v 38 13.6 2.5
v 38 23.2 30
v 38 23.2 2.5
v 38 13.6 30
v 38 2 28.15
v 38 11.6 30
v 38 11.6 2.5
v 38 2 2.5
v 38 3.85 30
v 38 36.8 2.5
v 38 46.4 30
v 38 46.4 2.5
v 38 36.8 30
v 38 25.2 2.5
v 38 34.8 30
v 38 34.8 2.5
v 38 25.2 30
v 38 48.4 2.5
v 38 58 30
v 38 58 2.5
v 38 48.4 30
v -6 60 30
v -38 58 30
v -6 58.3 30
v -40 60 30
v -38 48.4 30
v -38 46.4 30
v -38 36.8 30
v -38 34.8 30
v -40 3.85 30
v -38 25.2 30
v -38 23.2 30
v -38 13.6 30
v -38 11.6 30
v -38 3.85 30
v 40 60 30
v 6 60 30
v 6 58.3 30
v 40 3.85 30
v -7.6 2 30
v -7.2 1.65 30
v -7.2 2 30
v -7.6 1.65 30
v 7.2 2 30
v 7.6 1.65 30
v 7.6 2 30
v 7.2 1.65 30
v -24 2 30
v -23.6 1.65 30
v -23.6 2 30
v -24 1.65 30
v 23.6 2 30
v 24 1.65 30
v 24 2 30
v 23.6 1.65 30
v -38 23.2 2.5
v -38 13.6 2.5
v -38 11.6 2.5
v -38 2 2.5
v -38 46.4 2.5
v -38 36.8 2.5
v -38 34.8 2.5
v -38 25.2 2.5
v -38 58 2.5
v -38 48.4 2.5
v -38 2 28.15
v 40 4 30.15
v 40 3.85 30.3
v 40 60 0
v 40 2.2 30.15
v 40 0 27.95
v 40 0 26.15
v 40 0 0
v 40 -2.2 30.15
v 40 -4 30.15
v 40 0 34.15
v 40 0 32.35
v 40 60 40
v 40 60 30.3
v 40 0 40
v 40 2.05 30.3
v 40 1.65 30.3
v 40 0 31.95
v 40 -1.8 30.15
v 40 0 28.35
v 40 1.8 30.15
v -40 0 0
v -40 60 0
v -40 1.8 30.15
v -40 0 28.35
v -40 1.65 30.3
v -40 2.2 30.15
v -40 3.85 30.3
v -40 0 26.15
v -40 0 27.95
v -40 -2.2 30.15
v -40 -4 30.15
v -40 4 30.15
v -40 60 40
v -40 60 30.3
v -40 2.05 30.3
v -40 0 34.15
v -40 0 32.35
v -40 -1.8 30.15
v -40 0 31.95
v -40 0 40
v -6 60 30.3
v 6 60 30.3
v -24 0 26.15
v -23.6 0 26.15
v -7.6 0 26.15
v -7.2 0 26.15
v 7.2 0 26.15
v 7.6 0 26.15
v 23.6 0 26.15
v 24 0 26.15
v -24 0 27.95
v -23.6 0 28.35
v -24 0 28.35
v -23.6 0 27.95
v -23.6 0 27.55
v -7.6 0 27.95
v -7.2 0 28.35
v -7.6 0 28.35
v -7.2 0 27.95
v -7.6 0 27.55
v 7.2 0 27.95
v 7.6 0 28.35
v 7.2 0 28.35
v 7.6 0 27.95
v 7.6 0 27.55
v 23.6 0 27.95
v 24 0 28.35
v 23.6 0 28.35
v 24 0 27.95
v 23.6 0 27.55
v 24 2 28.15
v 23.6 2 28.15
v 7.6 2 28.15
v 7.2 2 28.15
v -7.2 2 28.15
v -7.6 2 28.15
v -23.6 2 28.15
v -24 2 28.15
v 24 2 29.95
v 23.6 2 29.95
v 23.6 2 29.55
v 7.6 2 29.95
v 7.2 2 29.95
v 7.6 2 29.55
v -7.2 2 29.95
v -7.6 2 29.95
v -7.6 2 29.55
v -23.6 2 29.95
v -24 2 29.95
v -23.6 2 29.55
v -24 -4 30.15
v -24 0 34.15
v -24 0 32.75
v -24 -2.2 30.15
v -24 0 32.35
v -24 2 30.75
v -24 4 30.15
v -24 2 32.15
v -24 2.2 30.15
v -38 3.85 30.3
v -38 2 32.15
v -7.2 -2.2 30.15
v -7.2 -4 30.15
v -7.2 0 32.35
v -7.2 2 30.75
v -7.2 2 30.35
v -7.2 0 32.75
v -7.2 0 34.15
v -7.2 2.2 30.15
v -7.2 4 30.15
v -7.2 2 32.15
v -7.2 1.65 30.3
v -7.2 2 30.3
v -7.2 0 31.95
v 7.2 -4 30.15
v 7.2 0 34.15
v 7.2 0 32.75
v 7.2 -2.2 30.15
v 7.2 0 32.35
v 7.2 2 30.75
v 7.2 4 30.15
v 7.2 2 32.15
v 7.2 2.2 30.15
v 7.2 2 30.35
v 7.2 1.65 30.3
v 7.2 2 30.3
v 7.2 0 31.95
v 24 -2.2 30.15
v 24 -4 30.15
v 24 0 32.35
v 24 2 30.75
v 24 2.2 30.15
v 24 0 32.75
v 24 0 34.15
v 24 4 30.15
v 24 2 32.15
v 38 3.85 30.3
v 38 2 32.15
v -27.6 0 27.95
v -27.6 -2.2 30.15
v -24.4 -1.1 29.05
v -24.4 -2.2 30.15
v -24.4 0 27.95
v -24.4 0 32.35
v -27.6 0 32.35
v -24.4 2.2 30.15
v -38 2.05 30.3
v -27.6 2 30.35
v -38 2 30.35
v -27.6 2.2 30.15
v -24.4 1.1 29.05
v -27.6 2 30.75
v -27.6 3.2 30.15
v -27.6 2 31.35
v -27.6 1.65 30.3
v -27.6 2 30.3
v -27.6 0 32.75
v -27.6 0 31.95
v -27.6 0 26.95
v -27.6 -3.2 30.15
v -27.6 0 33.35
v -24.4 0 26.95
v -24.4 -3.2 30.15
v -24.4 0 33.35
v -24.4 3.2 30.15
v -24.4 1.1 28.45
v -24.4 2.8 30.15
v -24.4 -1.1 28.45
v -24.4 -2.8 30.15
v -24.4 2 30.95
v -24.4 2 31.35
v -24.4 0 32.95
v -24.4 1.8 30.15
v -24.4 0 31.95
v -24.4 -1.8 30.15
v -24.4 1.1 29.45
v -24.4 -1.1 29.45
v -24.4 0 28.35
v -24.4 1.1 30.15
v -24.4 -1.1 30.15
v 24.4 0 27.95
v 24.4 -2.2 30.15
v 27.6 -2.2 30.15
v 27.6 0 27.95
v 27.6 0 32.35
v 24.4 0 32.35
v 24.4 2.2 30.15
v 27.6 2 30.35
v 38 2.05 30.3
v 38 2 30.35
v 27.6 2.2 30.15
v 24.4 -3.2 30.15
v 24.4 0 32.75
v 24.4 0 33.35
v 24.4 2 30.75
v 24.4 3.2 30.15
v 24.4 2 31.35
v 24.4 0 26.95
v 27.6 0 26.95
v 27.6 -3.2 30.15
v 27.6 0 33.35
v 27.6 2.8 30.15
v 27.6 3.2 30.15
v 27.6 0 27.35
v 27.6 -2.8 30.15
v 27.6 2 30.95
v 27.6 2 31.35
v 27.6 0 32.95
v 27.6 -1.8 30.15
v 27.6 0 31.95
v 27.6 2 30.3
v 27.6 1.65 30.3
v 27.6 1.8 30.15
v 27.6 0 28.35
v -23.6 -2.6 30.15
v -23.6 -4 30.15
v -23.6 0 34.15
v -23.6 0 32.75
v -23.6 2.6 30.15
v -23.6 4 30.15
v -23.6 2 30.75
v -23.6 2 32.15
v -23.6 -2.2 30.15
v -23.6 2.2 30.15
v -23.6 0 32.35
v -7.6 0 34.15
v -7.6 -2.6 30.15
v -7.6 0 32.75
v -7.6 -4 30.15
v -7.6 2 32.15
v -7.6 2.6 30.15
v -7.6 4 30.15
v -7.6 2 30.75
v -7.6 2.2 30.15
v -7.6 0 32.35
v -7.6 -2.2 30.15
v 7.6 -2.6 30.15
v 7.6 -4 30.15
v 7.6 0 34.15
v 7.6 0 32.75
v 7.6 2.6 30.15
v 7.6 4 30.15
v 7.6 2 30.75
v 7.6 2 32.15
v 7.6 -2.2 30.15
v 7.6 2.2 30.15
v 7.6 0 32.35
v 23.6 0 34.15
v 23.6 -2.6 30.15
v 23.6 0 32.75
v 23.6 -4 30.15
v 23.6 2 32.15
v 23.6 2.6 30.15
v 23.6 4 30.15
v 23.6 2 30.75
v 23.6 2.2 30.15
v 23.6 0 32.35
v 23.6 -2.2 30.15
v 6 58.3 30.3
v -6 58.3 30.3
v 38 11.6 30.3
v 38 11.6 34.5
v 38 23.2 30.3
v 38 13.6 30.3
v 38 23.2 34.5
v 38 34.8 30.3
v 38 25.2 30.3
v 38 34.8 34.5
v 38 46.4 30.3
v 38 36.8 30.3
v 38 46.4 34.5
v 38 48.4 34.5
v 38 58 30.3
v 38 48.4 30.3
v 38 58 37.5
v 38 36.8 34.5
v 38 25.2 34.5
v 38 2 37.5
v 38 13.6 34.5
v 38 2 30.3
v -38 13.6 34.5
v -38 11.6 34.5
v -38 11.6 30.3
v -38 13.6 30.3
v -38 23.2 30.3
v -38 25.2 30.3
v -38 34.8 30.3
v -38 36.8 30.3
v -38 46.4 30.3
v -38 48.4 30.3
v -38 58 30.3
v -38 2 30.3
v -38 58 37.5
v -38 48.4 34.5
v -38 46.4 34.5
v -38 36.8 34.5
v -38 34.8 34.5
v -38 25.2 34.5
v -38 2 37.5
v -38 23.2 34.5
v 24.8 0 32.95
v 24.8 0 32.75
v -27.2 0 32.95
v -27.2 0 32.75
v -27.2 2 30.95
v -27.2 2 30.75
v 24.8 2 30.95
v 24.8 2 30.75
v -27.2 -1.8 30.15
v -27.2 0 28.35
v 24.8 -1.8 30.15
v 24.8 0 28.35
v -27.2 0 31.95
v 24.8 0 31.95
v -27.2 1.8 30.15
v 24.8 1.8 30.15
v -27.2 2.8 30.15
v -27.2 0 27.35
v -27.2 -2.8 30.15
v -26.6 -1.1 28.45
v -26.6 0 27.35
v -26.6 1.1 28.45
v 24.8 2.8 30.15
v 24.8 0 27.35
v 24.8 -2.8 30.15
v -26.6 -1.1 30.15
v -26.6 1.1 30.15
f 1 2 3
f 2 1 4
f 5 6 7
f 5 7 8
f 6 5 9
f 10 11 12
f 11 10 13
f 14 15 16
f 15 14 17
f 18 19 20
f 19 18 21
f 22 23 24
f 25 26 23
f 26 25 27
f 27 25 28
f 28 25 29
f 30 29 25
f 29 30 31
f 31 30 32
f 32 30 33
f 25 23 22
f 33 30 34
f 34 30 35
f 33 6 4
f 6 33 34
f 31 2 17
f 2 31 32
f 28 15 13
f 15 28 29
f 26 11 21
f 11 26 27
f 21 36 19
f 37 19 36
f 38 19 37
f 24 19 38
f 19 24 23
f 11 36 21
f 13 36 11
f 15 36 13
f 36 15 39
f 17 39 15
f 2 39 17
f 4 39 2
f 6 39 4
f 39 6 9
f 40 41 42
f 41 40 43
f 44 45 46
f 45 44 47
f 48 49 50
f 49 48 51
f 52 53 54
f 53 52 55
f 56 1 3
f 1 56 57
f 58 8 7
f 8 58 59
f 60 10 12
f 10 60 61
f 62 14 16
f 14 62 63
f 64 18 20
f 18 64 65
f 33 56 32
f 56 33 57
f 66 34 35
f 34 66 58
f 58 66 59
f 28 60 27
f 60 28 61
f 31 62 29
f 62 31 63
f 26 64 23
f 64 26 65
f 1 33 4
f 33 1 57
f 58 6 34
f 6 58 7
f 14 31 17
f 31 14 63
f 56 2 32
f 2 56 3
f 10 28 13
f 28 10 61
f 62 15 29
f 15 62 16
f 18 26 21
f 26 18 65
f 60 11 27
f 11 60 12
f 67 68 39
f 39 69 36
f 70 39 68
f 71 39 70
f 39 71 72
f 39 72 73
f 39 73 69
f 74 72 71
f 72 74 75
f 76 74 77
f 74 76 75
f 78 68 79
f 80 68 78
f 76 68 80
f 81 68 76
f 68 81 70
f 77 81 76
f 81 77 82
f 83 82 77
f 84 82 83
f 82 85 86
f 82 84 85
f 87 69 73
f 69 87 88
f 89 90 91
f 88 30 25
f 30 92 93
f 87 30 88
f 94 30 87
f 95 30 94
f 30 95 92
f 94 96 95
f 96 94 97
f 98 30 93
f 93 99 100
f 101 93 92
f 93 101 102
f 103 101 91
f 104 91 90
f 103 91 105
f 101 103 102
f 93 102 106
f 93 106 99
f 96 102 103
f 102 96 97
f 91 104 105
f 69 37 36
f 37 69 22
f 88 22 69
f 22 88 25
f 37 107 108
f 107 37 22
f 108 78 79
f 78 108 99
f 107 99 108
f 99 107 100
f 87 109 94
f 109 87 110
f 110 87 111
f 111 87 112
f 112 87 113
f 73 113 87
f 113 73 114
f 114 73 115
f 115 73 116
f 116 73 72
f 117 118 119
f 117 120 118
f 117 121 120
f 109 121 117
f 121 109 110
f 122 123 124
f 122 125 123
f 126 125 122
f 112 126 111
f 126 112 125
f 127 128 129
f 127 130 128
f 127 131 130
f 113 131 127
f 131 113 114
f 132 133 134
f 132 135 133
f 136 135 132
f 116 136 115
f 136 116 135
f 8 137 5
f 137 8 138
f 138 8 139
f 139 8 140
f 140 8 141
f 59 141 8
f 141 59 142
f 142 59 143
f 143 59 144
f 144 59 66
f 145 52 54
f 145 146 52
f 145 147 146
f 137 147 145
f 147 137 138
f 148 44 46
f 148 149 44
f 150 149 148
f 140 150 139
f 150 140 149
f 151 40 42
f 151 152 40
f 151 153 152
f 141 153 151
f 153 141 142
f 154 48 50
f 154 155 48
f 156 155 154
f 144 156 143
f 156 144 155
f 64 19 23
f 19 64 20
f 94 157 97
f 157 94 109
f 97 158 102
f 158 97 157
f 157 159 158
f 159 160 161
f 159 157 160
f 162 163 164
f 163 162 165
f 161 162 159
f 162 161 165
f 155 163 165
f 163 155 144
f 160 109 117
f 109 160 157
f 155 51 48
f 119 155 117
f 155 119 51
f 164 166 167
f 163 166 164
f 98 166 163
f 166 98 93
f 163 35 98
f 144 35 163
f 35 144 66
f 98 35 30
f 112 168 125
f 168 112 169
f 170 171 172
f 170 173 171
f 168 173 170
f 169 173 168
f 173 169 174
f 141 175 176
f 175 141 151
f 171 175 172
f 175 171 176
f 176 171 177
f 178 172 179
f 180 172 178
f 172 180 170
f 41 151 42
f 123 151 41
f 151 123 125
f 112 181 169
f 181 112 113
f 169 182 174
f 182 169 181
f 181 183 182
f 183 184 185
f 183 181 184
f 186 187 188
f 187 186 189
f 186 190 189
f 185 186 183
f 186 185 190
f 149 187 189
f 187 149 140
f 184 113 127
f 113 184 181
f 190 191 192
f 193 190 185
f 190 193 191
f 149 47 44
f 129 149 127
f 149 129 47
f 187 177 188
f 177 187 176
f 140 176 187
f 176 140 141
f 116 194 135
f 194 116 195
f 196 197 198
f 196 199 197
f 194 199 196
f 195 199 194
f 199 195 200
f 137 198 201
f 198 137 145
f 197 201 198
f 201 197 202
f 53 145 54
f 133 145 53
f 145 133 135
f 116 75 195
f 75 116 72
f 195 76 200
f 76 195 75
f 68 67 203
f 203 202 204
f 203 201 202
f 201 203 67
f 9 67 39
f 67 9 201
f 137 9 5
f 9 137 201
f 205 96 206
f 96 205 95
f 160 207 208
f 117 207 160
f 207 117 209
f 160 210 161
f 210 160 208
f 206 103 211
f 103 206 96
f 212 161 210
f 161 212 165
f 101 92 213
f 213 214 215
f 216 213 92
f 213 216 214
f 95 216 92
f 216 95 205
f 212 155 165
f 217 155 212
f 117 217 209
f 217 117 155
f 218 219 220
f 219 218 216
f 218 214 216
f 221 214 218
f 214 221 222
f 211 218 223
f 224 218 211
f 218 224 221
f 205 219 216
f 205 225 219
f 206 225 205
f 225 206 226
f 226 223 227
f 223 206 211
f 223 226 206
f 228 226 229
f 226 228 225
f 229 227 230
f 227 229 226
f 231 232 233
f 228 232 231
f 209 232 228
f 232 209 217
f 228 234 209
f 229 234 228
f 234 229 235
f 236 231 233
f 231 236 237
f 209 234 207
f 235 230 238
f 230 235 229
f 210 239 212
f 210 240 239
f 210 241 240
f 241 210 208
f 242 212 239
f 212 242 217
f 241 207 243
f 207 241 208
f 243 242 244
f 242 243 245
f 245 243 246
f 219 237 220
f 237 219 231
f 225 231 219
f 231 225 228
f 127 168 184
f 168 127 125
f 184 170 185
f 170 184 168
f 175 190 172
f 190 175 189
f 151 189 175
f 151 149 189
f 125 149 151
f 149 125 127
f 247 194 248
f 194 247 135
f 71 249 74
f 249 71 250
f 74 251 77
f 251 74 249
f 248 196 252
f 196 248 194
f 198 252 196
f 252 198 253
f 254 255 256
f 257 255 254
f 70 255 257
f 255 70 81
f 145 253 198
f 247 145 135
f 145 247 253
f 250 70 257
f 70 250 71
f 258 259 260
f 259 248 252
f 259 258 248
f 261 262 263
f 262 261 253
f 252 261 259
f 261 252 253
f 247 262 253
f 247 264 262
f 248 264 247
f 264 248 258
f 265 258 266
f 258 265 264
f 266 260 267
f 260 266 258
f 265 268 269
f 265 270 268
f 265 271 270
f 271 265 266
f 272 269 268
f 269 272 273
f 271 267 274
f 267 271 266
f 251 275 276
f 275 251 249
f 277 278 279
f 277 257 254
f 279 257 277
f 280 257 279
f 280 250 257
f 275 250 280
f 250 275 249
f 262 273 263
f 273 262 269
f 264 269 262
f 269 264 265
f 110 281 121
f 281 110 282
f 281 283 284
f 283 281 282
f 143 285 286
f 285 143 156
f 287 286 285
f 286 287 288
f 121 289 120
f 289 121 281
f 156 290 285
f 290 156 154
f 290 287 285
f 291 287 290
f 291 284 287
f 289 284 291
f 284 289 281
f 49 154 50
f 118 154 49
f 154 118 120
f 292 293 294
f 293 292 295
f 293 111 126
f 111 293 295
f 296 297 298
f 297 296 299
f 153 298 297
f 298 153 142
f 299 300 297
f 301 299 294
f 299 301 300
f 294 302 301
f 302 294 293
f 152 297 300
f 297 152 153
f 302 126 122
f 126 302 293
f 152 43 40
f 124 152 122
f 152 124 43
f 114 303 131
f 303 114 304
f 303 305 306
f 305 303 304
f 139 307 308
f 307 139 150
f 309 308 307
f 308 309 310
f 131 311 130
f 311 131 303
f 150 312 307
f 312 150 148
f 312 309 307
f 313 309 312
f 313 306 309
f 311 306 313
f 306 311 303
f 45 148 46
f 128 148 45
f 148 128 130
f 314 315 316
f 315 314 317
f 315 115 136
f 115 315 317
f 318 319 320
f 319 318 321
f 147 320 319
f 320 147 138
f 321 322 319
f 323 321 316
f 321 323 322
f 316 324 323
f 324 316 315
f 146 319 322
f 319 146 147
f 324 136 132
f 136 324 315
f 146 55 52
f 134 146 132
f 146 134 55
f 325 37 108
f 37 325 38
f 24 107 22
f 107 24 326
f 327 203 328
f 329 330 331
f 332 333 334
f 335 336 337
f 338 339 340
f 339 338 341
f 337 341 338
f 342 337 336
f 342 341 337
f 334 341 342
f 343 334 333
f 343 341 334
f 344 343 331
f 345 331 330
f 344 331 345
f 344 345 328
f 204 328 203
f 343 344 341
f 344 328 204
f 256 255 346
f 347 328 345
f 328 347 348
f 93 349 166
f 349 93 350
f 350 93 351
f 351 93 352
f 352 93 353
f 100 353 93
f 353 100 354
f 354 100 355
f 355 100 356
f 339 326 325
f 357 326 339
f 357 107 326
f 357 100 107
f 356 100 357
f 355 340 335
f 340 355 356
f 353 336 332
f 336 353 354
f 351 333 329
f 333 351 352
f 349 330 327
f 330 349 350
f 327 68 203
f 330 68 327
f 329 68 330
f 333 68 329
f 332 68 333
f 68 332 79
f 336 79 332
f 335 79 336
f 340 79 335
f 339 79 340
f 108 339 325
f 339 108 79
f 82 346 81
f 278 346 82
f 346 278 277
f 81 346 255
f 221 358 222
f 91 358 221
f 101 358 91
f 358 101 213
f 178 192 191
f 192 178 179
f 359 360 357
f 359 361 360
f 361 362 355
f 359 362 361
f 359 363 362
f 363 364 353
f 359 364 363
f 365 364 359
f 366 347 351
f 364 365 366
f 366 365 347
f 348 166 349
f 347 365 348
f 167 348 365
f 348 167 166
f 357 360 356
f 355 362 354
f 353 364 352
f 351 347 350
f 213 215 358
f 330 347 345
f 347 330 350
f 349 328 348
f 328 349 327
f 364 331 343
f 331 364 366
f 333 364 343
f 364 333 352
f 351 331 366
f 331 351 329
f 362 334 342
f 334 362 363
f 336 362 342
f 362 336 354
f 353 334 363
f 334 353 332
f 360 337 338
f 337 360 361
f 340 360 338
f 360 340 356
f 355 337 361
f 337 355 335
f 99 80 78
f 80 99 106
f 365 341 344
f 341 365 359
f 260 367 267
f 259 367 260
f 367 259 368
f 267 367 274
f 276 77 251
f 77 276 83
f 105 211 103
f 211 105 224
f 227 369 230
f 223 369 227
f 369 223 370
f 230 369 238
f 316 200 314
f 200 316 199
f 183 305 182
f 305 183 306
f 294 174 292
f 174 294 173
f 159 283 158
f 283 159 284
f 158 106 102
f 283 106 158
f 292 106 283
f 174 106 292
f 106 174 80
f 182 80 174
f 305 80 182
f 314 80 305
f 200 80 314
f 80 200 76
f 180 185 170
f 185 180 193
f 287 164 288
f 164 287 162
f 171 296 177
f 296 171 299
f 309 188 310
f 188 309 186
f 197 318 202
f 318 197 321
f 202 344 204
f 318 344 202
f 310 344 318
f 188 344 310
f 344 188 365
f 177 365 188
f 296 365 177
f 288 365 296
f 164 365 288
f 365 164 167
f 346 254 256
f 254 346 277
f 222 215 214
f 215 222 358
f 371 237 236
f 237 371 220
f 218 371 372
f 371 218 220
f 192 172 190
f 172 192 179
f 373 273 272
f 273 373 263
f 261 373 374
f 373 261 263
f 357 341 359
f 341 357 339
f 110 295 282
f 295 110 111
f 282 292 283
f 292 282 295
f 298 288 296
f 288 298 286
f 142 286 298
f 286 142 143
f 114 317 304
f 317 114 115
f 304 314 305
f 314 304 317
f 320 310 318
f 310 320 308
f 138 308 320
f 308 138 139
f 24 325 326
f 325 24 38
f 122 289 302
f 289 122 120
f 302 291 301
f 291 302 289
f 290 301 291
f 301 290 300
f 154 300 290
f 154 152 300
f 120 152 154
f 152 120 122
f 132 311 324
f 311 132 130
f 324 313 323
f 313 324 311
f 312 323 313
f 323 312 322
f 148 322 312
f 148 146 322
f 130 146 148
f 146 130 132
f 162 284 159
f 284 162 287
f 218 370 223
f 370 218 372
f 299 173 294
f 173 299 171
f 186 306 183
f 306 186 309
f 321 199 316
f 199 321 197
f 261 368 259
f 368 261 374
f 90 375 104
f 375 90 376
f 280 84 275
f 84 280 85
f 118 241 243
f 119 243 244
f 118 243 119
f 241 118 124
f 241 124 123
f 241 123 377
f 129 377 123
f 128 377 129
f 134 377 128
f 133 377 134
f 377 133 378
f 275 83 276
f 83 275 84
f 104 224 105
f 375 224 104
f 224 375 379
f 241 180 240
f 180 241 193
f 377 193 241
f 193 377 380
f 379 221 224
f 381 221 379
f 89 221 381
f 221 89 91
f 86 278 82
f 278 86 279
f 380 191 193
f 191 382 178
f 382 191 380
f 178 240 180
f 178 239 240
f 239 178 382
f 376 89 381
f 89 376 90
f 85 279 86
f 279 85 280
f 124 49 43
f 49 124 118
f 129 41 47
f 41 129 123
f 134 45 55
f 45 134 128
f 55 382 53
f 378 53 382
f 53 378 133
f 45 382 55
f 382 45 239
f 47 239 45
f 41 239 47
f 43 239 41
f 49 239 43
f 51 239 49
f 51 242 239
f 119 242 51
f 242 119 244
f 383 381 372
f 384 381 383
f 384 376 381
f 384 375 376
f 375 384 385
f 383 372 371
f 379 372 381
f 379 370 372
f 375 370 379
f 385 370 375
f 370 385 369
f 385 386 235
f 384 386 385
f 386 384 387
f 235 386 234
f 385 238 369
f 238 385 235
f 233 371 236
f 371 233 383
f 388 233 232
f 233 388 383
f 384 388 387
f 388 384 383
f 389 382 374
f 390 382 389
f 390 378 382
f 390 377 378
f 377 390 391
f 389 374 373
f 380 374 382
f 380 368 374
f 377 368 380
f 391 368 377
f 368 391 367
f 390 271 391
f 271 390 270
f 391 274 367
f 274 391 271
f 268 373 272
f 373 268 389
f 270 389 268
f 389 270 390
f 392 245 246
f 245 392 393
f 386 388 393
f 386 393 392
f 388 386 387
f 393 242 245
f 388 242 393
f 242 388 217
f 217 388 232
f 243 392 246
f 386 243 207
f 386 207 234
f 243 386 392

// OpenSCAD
/* Box with print-in-place hinge - step 1: params + base */
part = "assembly"; // [base, lid, pin, assembly]

cadverify_only = "";
module instance(name, part, unit = 1) {
    echo(cadverify_instance = [name, part, unit]);
    if (cadverify_only == "" || cadverify_only == name) children();
}

// ---- parameters (mm) ----
W = 80; D = 60; H = 40;          // body outer, closed
baseH = 30;                      // base height
gapZLid = 0.3;                   // lid-base vertical gap
lidBot = baseH + gapZLid;        // 30.3
lidTop = H;                      // 40
axY = 2; axZ = baseH + gapZLid/2; // hinge axis (2, 30.15)
wallT = 2; floorT = 2.5; lidTopT = 2.5;
pinH = 1.8; boreH = 2.2; outH = 4.0; cbH = 3.2; capH = 2.8;
clrR = 0.4; clrA = 0.4;
divT = 2; divTop = 37.2;

// knuckle X intervals
bx10=-40; bx11=-24; lx10=-23.6; lx11=-7.6;
bx20=-7.2; bx21=7.2; lx20=7.6; lx21=23.6; bx30=24; bx31=40;

// generic prism along X from polygon in (Z,Y) mapped: poly points [z,y]
module prism_x(poly, x0, len) {
    translate([x0, 0, 0]) rotate([0,90,0])
        linear_extrude(height=len) polygon(poly);
}
function diamond(h) = [[-h,0],[0,-h],[h,0],[0,h]];

module knuckle_out(x0, len) {
    // diamond cross-section points [z,y] centered at (axZ, axY)
    p = diamond(outH);
    translate([0, axY, axZ]) prism_x(p, x0, len);
}
module bore_small(x0, len) {
    p = diamond(boreH);
    translate([0, axY, axZ]) prism_x(p, x0, len);
}
module bore_cb(x0, len) {
    p = diamond(cbH);
    translate([0, axY, axZ]) prism_x(p, x0, len);
}

function D(h,y0,z0) = [[-z0+h,y0],[-z0,y0-h],[-z0-h,y0],[-z0,y0+h]];
module dia(h,y0,z0,x0,x1) {
    translate([x0,0,0]) rotate([0,90,0])
        linear_extrude(height=x1-x0, convexity=4) polygon(D(h,y0,z0));
}
module base_geo() {
    difference() {
        union() {
            translate([-40,0,0]) cube([80,60,2.5]);            // floor
            translate([-40,0,0]) cube([80,2,30]);              // back wall
            translate([-40,58,0]) cube([80,2,30]);             // front wall
            translate([-40,2,0]) cube([2,56,30]);              // left wall
            translate([38,2,0]) cube([2,56,30]);               // right wall
            for (cy=[12.6,24.2,35.8,47.4])
                translate([-38,cy-1,2.5]) cube([76,2,27.5]);   // dividers
            dia(outH,0,axZ,bx10,bx11);                         // knuckles
            dia(outH,0,axZ,bx20,bx21);
            dia(outH,0,axZ,bx30,bx31);
        }
        // bore channels + cap pockets
        dia(boreH,0,axZ,bx10,bx11); dia(cbH,0,axZ,-27.6,-24.4);
        dia(boreH,0,axZ,bx20,bx21);
        dia(boreH,0,axZ,bx30,bx31); dia(cbH,0,axZ,24.4,27.6);
        // back-wall notches under lid knuckles
        dia(boreH+clrR,0,axZ,lx10,lx11);
        dia(boreH+clrR,0,axZ,lx20,lx21);
        // catch groove in front wall outer face
        translate([-6,58.8,27.5]) cube([12,1.21,1.5]);
    }
}

module lid_geo() {
    difference() {
        union() {
            // top plate: x -40..40, y 0..60, z 37.5..40
            translate([-40,0,37.5]) cube([80,60,2.5]);
            // lid skirt walls 2mm, y 0..60, z 30.3..37.5
            translate([-40,0,30.3]) cube([80,2,7.2]);    // back band
            translate([-40,58,30.3]) cube([80,2,7.2]);   // front band
            translate([-40,2,30.3]) cube([2,56,7.2]);    // left band
            translate([38,2,30.3]) cube([2,56,7.2]);     // right band
            // lid skirt inner closure panels (also skirt divider walls)
            for (cy=[12.6,24.2,35.8,47.4])
                translate([-38,cy-1,30.3]) cube([76,2,4.2]);  // up to 34.5
            // lid knuckles + catch tongue
            dia(outH,0,axZ,lx10,lx11);
            dia(outH,0,axZ,lx20,lx21);
            translate([-6,58.3,27.5]) cube([12,1.7,3.4]);  // tongue tab below front band
        }
        // bore channels
        dia(boreH,0,axZ,lx10,lx11);
        dia(boreH,0,axZ,lx20,lx21);
        // clearance pockets opposite base knuckles
        dia(boreH+clrR,0,axZ,-27.6,-23.6);
        dia(boreH+clrR,0,axZ,-7.6,-7.2);
        dia(boreH+clrR,0,axZ,7.2,7.6);
        dia(boreH+clrR,0,axZ,23.6,27.6);
    }
}
module pin_geo() {
    difference() {
        union() {
            // shaft full hinge length x -40..40
            dia(pinH,0,axZ,-40,40);
            // retaining collars trapped in base counterbores
            dia(capH,0,axZ,-27.2,-24.4);      // left head in pocket -27.6..-24.4
            dia(capH,0,axZ,24.8,27.6);        // right head in pocket 24.4..27.6
        }
        // left head slot (screwdriver grip) open at bottom
        translate([-26.6,-1.1,axZ-14]) cube([2.2,2.2,14]);
    }
}
// --- part orientation helpers + spec + assembly ---

if (part=="base") { base_geo(); }
else if (part=="lid") { lid_geo(); }
else if (part=="pin") { pin_geo(); }
else if (part=="assembly") {
    instance("base","base") base_geo();
    instance("lid","lid") lid_geo();
    instance("pin","pin") pin_geo();
}
